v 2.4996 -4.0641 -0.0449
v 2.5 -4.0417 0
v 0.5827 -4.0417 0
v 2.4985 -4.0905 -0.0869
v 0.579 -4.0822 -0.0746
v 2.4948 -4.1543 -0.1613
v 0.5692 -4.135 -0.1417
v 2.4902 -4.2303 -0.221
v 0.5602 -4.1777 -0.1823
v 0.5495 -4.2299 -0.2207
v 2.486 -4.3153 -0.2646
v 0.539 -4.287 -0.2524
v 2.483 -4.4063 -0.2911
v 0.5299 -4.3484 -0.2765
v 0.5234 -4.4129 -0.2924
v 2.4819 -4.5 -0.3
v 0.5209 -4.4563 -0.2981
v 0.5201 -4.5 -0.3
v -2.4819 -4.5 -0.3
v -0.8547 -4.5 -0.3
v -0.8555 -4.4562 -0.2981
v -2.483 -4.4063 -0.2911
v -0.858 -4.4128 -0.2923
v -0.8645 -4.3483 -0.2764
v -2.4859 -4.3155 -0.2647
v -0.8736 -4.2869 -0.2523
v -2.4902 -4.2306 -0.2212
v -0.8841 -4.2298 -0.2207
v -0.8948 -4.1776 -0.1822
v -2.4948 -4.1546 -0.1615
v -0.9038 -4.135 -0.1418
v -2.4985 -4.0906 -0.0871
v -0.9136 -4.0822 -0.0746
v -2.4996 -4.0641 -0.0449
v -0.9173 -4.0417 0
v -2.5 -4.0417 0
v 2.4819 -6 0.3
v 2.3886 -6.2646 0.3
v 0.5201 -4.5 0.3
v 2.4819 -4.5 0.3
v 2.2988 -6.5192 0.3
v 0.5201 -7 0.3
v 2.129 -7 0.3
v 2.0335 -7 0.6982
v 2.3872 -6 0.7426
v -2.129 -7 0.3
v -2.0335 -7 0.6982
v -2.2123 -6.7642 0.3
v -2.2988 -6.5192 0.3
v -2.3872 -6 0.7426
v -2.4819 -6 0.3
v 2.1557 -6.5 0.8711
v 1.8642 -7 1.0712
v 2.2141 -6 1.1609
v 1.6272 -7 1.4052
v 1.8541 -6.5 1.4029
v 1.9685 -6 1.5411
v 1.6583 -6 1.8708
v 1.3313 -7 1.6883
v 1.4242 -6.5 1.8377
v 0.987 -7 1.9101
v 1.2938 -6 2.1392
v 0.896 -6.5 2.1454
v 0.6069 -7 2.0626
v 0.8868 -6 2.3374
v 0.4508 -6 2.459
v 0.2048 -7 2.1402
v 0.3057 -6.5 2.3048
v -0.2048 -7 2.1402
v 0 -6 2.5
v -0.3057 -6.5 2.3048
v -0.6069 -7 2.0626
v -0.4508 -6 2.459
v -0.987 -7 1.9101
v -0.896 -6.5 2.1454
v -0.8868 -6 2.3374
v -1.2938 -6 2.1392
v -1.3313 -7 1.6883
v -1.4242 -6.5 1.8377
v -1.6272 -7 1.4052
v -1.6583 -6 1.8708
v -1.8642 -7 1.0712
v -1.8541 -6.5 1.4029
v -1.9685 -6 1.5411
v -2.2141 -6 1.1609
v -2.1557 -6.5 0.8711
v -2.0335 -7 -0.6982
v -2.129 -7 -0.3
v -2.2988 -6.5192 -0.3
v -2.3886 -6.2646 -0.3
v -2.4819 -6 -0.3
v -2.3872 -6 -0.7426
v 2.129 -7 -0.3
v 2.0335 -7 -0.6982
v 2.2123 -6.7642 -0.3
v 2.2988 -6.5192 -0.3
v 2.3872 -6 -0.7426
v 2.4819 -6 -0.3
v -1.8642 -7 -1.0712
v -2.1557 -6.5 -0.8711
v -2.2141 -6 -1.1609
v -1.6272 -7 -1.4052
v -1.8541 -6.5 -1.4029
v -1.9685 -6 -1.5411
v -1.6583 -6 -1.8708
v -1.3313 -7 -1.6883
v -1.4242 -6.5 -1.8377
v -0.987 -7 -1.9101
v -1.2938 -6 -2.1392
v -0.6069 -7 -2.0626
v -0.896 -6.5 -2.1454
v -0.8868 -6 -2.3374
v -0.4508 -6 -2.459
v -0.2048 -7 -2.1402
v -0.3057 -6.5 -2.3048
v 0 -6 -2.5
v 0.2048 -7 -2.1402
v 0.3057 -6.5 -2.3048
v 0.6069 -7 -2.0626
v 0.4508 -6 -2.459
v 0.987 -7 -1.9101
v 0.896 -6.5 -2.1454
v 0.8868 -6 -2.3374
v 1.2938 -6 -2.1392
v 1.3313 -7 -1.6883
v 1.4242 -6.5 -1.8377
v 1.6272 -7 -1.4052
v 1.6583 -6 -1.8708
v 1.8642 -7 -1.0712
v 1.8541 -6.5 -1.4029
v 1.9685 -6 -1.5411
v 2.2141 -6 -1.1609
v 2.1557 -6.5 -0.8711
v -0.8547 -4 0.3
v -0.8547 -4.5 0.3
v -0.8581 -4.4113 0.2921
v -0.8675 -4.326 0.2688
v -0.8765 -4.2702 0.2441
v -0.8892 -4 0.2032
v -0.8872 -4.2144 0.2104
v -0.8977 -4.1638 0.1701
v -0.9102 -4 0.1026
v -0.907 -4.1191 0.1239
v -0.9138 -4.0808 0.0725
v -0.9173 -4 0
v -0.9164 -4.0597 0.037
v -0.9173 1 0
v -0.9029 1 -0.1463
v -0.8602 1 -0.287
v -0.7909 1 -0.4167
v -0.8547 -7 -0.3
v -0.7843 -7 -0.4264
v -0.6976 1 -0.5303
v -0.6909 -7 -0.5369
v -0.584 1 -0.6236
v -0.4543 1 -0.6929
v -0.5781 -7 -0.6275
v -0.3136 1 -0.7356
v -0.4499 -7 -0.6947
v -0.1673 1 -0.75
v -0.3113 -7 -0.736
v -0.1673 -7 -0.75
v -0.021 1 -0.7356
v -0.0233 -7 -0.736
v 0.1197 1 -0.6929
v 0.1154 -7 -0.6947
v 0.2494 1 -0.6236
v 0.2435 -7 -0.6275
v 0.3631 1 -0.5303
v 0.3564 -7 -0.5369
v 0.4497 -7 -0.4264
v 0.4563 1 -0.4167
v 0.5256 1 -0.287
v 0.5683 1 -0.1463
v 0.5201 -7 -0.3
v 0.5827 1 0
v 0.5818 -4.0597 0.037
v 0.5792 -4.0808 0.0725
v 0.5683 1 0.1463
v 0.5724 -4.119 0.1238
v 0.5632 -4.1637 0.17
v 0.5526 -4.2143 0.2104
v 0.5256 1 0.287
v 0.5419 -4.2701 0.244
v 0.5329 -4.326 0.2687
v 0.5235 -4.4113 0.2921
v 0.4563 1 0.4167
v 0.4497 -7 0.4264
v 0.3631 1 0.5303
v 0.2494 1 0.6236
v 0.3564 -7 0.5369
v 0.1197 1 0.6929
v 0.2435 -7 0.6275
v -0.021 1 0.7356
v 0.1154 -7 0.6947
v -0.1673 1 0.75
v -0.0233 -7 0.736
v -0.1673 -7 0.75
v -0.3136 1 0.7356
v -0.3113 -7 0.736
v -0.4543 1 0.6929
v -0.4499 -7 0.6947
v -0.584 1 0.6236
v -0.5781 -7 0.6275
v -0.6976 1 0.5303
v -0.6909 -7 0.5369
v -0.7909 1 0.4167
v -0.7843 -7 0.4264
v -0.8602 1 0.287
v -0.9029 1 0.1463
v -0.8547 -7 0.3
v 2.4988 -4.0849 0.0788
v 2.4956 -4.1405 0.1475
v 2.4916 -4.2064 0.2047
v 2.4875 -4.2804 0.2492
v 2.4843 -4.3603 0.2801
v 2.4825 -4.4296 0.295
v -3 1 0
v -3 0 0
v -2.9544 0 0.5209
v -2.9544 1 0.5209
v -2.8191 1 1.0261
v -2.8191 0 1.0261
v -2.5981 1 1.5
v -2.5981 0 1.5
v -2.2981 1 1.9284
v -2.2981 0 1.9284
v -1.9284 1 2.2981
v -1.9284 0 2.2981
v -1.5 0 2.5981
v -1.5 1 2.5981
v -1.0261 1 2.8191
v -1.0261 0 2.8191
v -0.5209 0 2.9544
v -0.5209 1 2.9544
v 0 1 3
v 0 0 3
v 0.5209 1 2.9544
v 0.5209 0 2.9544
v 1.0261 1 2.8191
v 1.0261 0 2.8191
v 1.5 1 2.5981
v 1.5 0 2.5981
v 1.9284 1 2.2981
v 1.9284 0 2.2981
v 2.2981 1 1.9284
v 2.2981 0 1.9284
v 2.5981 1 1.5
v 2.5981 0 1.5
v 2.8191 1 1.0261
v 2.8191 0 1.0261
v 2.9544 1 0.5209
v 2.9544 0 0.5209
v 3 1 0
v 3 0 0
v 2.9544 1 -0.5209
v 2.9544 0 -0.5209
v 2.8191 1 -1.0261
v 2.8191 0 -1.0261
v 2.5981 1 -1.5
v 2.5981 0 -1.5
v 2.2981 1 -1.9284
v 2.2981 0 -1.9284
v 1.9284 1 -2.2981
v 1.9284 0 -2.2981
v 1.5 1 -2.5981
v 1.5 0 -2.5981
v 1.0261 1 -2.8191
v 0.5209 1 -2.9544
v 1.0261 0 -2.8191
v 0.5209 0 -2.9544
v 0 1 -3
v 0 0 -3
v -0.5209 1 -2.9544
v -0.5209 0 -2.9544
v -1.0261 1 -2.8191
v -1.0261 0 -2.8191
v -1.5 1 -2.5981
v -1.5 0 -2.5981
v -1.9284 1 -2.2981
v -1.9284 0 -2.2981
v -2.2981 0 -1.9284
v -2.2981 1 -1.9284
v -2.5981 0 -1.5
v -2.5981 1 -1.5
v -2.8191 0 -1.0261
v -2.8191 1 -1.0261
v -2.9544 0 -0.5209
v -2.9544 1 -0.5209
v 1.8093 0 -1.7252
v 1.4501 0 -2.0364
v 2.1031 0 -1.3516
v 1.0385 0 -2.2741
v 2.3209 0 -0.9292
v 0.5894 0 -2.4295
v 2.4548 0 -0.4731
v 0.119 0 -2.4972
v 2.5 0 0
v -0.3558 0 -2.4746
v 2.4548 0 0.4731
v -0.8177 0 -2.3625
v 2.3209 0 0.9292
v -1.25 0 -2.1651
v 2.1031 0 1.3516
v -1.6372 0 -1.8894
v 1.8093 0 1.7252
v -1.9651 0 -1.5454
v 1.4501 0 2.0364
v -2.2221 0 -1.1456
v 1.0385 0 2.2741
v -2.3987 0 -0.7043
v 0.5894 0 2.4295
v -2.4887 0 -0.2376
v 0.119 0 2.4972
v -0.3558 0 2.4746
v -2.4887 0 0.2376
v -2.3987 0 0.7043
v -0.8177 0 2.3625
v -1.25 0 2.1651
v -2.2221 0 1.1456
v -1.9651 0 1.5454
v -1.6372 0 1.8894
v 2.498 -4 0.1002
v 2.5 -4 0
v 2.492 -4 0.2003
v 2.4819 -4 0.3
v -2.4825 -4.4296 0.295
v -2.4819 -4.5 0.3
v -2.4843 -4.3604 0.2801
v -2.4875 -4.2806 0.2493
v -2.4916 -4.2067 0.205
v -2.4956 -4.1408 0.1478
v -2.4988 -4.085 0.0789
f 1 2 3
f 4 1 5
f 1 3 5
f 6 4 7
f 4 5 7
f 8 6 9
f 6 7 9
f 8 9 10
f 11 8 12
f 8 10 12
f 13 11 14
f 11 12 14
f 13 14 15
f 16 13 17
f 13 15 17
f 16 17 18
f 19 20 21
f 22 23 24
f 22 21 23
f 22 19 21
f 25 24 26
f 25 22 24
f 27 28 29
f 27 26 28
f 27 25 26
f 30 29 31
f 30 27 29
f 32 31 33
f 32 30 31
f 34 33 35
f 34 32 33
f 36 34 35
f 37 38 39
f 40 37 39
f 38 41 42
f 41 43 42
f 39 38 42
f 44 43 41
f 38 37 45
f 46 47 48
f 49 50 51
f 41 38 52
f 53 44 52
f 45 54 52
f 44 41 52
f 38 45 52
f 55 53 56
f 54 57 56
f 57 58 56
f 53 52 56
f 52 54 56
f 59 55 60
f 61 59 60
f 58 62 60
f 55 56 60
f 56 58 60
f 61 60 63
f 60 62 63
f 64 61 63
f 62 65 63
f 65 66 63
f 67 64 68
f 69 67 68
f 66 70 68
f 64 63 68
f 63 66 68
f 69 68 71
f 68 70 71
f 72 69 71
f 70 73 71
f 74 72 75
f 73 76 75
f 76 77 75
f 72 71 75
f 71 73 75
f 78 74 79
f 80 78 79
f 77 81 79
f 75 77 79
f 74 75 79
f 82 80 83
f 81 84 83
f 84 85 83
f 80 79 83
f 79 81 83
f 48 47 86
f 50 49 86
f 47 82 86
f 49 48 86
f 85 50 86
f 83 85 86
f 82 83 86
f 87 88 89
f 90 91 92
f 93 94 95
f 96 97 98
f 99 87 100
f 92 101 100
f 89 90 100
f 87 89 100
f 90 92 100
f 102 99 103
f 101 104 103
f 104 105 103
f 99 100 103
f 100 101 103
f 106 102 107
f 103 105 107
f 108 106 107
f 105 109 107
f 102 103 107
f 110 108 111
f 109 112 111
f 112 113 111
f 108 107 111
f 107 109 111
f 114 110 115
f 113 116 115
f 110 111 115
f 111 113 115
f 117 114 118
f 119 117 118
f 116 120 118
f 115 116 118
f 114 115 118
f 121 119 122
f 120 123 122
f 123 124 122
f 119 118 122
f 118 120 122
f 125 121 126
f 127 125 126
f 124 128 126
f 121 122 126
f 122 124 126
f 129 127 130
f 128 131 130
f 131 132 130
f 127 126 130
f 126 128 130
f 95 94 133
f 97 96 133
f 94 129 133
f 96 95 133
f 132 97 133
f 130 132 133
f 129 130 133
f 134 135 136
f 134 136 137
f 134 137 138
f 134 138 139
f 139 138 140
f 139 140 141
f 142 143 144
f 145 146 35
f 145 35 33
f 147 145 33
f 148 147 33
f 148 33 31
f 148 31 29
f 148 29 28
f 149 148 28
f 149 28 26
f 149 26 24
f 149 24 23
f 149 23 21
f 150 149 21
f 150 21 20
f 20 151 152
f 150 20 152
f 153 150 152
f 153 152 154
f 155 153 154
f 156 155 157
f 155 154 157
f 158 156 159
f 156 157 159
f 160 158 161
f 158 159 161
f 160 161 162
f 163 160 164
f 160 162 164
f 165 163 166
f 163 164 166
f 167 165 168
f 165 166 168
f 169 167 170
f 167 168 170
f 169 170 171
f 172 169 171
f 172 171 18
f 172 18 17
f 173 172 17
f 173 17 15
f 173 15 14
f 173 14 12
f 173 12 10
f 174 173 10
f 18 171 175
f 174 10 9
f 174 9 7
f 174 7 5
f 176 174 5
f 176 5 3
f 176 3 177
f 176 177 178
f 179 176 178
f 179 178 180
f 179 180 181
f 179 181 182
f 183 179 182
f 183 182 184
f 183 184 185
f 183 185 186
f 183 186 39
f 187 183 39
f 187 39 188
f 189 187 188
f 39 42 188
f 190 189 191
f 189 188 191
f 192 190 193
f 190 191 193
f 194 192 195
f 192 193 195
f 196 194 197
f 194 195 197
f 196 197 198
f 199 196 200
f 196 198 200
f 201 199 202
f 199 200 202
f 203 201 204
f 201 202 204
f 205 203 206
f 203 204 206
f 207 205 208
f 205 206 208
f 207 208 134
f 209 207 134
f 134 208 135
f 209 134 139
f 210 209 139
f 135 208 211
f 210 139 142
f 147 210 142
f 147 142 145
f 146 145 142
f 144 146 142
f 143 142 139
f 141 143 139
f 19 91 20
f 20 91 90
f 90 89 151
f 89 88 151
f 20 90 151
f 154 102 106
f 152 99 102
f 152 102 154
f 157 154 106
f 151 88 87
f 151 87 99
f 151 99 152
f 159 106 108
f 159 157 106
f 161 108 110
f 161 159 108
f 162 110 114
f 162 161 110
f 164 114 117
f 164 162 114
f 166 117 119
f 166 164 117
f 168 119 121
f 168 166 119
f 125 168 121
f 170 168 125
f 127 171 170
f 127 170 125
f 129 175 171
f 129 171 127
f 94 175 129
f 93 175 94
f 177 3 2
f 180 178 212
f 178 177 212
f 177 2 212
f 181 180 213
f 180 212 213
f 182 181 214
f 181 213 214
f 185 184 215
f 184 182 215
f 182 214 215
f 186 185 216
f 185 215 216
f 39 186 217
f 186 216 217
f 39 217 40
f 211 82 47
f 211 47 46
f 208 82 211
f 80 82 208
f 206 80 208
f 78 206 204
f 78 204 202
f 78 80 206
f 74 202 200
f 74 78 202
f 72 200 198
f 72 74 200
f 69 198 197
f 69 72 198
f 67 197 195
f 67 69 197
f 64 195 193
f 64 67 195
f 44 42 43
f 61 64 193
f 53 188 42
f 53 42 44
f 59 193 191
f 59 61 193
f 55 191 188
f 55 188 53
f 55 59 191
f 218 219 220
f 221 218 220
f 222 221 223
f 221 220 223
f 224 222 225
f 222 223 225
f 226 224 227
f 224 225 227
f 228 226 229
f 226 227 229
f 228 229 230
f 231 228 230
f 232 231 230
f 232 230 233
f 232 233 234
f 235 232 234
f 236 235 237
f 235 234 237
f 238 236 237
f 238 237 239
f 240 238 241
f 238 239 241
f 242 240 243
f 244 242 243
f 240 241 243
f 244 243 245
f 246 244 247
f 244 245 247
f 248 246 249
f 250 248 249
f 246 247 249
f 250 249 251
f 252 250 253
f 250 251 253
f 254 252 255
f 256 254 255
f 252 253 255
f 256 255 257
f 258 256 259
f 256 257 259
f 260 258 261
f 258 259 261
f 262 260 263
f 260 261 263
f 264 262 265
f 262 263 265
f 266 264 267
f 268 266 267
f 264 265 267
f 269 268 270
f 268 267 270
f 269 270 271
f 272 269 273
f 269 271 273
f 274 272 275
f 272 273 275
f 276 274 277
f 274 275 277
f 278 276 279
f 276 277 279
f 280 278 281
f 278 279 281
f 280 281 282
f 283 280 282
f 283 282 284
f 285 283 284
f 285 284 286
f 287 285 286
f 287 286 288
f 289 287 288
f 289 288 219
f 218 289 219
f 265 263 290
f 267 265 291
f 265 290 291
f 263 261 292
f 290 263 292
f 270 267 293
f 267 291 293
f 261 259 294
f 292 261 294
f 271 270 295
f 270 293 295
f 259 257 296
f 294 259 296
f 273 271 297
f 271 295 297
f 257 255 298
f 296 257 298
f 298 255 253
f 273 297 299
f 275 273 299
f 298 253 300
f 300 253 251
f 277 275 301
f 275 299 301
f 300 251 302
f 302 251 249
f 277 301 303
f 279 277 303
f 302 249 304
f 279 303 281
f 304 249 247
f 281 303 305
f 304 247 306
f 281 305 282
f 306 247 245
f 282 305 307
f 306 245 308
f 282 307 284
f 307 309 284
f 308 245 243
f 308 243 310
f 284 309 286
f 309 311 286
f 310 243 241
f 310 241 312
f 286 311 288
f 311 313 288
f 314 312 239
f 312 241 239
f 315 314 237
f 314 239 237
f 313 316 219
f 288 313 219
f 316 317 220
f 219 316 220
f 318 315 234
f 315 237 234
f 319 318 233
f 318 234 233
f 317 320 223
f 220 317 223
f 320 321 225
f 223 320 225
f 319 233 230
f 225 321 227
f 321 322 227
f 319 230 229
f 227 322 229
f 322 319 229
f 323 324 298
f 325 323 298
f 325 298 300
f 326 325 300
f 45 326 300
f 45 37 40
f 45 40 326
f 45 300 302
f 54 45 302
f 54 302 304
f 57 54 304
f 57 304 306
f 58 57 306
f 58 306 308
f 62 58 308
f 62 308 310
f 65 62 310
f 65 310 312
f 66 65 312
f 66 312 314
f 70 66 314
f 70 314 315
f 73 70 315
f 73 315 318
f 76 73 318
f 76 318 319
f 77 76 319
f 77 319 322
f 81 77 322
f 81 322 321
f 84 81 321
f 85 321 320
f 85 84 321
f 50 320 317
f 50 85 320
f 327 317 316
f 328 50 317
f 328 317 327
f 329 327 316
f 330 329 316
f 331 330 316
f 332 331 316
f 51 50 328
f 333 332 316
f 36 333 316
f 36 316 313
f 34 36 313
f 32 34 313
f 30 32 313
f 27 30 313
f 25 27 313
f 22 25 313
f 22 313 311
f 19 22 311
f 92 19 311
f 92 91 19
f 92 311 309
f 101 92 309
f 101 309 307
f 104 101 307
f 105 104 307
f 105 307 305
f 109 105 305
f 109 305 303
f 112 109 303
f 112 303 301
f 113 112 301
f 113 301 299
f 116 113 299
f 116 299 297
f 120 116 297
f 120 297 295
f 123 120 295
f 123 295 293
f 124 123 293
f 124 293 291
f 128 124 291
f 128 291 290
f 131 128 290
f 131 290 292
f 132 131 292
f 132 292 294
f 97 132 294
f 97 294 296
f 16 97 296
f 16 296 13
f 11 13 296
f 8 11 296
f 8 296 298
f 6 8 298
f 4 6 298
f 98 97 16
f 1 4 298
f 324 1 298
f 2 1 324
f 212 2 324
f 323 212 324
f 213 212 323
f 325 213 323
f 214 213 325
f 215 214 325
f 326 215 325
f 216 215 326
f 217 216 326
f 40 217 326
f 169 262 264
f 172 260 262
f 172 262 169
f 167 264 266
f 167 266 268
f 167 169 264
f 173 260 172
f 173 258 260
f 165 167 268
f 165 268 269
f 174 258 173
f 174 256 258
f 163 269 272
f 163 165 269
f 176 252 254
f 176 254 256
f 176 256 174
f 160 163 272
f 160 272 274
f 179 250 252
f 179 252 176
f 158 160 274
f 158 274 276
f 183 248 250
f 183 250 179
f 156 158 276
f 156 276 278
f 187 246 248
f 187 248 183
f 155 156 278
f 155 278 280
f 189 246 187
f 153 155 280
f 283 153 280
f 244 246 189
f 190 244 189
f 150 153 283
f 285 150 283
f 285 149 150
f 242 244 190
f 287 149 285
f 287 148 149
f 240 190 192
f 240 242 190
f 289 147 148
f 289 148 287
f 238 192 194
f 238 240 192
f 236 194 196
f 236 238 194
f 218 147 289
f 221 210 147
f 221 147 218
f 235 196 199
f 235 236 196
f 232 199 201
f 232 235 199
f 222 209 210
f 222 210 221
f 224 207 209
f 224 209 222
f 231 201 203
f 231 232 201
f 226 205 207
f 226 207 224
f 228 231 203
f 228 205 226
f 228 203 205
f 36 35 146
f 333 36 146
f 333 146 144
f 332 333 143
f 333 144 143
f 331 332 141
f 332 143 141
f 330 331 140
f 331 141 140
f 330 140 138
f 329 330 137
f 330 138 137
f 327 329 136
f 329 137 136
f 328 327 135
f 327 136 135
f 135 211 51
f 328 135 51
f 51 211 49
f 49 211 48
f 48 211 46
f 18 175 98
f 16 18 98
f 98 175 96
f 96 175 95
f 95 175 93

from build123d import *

# Parameters (mm, degrees)
F0_R          = 2.5
F1_DEPTH      = 6
F3_R          = 2.15
F1_FACE_R     = 2.5
F6_R          = 3
F7_DEPTH      = 1
F9_R          = 0.75
F10_DEPTH     = 8.0010001
F12_W         = 3
F12_H         = 0.3
F13_DEPTH     = 3
F14_T4_DEPTH  = 4.4618227718
F14_S5_R      = 2.5
F14_T6_DEPTH  = 4
F14_S7_R      = 0.75
F14_T8_DEPTH  = 4
F14_T12_DEPTH = 4.1272739781
F14_S13_R     = 2.5
F14_T14_DEPTH = 4
F14_S15_R     = 0.75
F14_T16_DEPTH = 4
F14_T20_DEPTH = 4.4618227718
F14_S21_R     = 2.5
F14_T22_DEPTH = 4
F14_S23_R     = 0.75
F14_T24_DEPTH = 4
F14_T28_DEPTH = 4.1272739781
F14_S29_R     = 2.5
F14_T30_DEPTH = 4
F14_S31_R     = 0.75
F14_T32_DEPTH = 4


# Not quite as in the source:
# - a fillet or chamfer that OpenCascade refuses, or shapes differently, is made with other operations: its cross-section is extruded or revolved along the edge and cut away or added


with BuildPart() as f1:
    # F0 (on Front) → F1 (new body)
    with BuildSketch(Plane.XZ):
        Circle(F0_R)
    extrude(amount=F1_DEPTH)

    # F3 (on offset) → F4 section 0
    with BuildSketch(Plane.XZ.offset(7)):
        Circle(F3_R)
    # F1_face (on face) → F4 section 1
    with BuildSketch(Plane.XZ.offset(6)):
        Circle(F1_FACE_R)
    loft()

    # F6 (on offset) → F7 (join)
    with BuildSketch(Plane(origin=(0, 0, 0), x_dir=(-1, 0, 0), z_dir=(0, 1, 0))):
        Circle(F6_R)
    extrude(amount=F7_DEPTH)

    # F9 (on offset) → F10 (cut, through all)
    with BuildSketch(Plane(origin=(0, 1, 0), x_dir=(-1, 0, 0), z_dir=(0, 1, 0))):
        with Locations((0.1672743968, 0)):
            Circle(F9_R)
    extrude(amount=-F10_DEPTH, mode=Mode.SUBTRACT)

    # F12 (on offset) → F13 (cut)
    with BuildSketch(Plane.XZ.offset(7)):
        with Locations((1.5, 0.15)):
            Rectangle(F12_W, F12_H)
        Polygon((3, 0), (0, 0), (0, 0.3), (-3, 0.3), (-3, 0), (-3, -0.3), (0, -0.3), (3, -0.3), align=None)
    extrude(amount=-F13_DEPTH, mode=Mode.SUBTRACT)

    # F14: fillet of radius 0.5 on 4 edges, made by hand


with BuildPart() as f14_tool2:
    # F14_s3 → F14_t4 (new body)
    with BuildSketch(Plane.YZ.offset(-0.7298880426)):
        with BuildLine():
            ThreePointArc((-4, 0.2), (-4.1464466094, -0.1535533906), (-4.5, -0.3))
            Line((-4.5, -0.3), (-4, -0.3))
            Line((-4, -0.3), (-4, 0.2))
        make_face()
    extrude(amount=F14_T4_DEPTH)

    # F14_s5 → F14_t6 (intersect, symmetric)
    with BuildSketch(Plane.XZ.offset(4.2)):
        Circle(F14_S5_R)
    extrude(amount=F14_T6_DEPTH, both=True, mode=Mode.INTERSECT)

    # F14_s7 → F14_t8 (cut, symmetric)
    with BuildSketch(Plane.XZ.offset(4.2)):
        with Locations((-0.1672743968, 0)):
            Circle(F14_S7_R)
    extrude(amount=F14_T8_DEPTH, both=True, mode=Mode.SUBTRACT)


with BuildPart() as f1_1:
    add(f1.part)

    # F14_t1: union F14_tool2
    add(f14_tool2.part)


with BuildPart() as f14_tool10:
    # F14_s11 → F14_t12 (new body)
    with BuildSketch(Plane.YZ.offset(-3.7319347292)):
        with BuildLine():
            ThreePointArc((-4.5, -0.3), (-4.1464466094, -0.1535533906), (-4, 0.2))
            Line((-4, 0.2), (-4, -0.3))
            Line((-4, -0.3), (-4.5, -0.3))
        make_face()
    extrude(amount=F14_T12_DEPTH)

    # F14_s13 → F14_t14 (intersect, symmetric)
    with BuildSketch(Plane.XZ.offset(4.2)):
        Circle(F14_S13_R)
    extrude(amount=F14_T14_DEPTH, both=True, mode=Mode.INTERSECT)

    # F14_s15 → F14_t16 (cut, symmetric)
    with BuildSketch(Plane.XZ.offset(4.2)):
        with Locations((-0.1672743968, 0)):
            Circle(F14_S15_R)
    extrude(amount=F14_T16_DEPTH, both=True, mode=Mode.SUBTRACT)


with BuildPart() as f1_2:
    add(f1_1.part)

    # F14_t9: union F14_tool10
    add(f14_tool10.part)


with BuildPart() as f14_tool18:
    # F14_s19 → F14_t20 (new body)
    with BuildSketch(Plane.YZ.offset(3.7319347292)):
        with BuildLine():
            ThreePointArc((-4, -0.2), (-4.1464466094, 0.1535533906), (-4.5, 0.3))
            Line((-4.5, 0.3), (-4, 0.3))
            Line((-4, 0.3), (-4, -0.2))
        make_face()
    extrude(amount=-F14_T20_DEPTH)

    # F14_s21 → F14_t22 (intersect, symmetric)
    with BuildSketch(Plane.XZ.offset(4.2)):
        Circle(F14_S21_R)
    extrude(amount=F14_T22_DEPTH, both=True, mode=Mode.INTERSECT)

    # F14_s23 → F14_t24 (cut, symmetric)
    with BuildSketch(Plane.XZ.offset(4.2)):
        with Locations((-0.1672743968, 0)):
            Circle(F14_S23_R)
    extrude(amount=F14_T24_DEPTH, both=True, mode=Mode.SUBTRACT)


with BuildPart() as f1_3:
    add(f1_2.part)

    # F14_t17: union F14_tool18
    add(f14_tool18.part)


with BuildPart() as f14_tool26:
    # F14_s27 → F14_t28 (new body)
    with BuildSketch(Plane.YZ.offset(0.3953392489)):
        with BuildLine():
            ThreePointArc((-4, -0.2), (-4.1464466094, 0.1535533906), (-4.5, 0.3))
            Line((-4.5, 0.3), (-4, 0.3))
            Line((-4, 0.3), (-4, -0.2))
        make_face()
    extrude(amount=-F14_T28_DEPTH)

    # F14_s29 → F14_t30 (intersect, symmetric)
    with BuildSketch(Plane.XZ.offset(4.2)):
        Circle(F14_S29_R)
    extrude(amount=F14_T30_DEPTH, both=True, mode=Mode.INTERSECT)

    # F14_s31 → F14_t32 (cut, symmetric)
    with BuildSketch(Plane.XZ.offset(4.2)):
        with Locations((-0.1672743968, 0)):
            Circle(F14_S31_R)
    extrude(amount=F14_T32_DEPTH, both=True, mode=Mode.SUBTRACT)


with BuildPart() as f1_4:
    add(f1_3.part)

    # F14_t25: union F14_tool26
    add(f14_tool26.part)


solid = f1_4.part
